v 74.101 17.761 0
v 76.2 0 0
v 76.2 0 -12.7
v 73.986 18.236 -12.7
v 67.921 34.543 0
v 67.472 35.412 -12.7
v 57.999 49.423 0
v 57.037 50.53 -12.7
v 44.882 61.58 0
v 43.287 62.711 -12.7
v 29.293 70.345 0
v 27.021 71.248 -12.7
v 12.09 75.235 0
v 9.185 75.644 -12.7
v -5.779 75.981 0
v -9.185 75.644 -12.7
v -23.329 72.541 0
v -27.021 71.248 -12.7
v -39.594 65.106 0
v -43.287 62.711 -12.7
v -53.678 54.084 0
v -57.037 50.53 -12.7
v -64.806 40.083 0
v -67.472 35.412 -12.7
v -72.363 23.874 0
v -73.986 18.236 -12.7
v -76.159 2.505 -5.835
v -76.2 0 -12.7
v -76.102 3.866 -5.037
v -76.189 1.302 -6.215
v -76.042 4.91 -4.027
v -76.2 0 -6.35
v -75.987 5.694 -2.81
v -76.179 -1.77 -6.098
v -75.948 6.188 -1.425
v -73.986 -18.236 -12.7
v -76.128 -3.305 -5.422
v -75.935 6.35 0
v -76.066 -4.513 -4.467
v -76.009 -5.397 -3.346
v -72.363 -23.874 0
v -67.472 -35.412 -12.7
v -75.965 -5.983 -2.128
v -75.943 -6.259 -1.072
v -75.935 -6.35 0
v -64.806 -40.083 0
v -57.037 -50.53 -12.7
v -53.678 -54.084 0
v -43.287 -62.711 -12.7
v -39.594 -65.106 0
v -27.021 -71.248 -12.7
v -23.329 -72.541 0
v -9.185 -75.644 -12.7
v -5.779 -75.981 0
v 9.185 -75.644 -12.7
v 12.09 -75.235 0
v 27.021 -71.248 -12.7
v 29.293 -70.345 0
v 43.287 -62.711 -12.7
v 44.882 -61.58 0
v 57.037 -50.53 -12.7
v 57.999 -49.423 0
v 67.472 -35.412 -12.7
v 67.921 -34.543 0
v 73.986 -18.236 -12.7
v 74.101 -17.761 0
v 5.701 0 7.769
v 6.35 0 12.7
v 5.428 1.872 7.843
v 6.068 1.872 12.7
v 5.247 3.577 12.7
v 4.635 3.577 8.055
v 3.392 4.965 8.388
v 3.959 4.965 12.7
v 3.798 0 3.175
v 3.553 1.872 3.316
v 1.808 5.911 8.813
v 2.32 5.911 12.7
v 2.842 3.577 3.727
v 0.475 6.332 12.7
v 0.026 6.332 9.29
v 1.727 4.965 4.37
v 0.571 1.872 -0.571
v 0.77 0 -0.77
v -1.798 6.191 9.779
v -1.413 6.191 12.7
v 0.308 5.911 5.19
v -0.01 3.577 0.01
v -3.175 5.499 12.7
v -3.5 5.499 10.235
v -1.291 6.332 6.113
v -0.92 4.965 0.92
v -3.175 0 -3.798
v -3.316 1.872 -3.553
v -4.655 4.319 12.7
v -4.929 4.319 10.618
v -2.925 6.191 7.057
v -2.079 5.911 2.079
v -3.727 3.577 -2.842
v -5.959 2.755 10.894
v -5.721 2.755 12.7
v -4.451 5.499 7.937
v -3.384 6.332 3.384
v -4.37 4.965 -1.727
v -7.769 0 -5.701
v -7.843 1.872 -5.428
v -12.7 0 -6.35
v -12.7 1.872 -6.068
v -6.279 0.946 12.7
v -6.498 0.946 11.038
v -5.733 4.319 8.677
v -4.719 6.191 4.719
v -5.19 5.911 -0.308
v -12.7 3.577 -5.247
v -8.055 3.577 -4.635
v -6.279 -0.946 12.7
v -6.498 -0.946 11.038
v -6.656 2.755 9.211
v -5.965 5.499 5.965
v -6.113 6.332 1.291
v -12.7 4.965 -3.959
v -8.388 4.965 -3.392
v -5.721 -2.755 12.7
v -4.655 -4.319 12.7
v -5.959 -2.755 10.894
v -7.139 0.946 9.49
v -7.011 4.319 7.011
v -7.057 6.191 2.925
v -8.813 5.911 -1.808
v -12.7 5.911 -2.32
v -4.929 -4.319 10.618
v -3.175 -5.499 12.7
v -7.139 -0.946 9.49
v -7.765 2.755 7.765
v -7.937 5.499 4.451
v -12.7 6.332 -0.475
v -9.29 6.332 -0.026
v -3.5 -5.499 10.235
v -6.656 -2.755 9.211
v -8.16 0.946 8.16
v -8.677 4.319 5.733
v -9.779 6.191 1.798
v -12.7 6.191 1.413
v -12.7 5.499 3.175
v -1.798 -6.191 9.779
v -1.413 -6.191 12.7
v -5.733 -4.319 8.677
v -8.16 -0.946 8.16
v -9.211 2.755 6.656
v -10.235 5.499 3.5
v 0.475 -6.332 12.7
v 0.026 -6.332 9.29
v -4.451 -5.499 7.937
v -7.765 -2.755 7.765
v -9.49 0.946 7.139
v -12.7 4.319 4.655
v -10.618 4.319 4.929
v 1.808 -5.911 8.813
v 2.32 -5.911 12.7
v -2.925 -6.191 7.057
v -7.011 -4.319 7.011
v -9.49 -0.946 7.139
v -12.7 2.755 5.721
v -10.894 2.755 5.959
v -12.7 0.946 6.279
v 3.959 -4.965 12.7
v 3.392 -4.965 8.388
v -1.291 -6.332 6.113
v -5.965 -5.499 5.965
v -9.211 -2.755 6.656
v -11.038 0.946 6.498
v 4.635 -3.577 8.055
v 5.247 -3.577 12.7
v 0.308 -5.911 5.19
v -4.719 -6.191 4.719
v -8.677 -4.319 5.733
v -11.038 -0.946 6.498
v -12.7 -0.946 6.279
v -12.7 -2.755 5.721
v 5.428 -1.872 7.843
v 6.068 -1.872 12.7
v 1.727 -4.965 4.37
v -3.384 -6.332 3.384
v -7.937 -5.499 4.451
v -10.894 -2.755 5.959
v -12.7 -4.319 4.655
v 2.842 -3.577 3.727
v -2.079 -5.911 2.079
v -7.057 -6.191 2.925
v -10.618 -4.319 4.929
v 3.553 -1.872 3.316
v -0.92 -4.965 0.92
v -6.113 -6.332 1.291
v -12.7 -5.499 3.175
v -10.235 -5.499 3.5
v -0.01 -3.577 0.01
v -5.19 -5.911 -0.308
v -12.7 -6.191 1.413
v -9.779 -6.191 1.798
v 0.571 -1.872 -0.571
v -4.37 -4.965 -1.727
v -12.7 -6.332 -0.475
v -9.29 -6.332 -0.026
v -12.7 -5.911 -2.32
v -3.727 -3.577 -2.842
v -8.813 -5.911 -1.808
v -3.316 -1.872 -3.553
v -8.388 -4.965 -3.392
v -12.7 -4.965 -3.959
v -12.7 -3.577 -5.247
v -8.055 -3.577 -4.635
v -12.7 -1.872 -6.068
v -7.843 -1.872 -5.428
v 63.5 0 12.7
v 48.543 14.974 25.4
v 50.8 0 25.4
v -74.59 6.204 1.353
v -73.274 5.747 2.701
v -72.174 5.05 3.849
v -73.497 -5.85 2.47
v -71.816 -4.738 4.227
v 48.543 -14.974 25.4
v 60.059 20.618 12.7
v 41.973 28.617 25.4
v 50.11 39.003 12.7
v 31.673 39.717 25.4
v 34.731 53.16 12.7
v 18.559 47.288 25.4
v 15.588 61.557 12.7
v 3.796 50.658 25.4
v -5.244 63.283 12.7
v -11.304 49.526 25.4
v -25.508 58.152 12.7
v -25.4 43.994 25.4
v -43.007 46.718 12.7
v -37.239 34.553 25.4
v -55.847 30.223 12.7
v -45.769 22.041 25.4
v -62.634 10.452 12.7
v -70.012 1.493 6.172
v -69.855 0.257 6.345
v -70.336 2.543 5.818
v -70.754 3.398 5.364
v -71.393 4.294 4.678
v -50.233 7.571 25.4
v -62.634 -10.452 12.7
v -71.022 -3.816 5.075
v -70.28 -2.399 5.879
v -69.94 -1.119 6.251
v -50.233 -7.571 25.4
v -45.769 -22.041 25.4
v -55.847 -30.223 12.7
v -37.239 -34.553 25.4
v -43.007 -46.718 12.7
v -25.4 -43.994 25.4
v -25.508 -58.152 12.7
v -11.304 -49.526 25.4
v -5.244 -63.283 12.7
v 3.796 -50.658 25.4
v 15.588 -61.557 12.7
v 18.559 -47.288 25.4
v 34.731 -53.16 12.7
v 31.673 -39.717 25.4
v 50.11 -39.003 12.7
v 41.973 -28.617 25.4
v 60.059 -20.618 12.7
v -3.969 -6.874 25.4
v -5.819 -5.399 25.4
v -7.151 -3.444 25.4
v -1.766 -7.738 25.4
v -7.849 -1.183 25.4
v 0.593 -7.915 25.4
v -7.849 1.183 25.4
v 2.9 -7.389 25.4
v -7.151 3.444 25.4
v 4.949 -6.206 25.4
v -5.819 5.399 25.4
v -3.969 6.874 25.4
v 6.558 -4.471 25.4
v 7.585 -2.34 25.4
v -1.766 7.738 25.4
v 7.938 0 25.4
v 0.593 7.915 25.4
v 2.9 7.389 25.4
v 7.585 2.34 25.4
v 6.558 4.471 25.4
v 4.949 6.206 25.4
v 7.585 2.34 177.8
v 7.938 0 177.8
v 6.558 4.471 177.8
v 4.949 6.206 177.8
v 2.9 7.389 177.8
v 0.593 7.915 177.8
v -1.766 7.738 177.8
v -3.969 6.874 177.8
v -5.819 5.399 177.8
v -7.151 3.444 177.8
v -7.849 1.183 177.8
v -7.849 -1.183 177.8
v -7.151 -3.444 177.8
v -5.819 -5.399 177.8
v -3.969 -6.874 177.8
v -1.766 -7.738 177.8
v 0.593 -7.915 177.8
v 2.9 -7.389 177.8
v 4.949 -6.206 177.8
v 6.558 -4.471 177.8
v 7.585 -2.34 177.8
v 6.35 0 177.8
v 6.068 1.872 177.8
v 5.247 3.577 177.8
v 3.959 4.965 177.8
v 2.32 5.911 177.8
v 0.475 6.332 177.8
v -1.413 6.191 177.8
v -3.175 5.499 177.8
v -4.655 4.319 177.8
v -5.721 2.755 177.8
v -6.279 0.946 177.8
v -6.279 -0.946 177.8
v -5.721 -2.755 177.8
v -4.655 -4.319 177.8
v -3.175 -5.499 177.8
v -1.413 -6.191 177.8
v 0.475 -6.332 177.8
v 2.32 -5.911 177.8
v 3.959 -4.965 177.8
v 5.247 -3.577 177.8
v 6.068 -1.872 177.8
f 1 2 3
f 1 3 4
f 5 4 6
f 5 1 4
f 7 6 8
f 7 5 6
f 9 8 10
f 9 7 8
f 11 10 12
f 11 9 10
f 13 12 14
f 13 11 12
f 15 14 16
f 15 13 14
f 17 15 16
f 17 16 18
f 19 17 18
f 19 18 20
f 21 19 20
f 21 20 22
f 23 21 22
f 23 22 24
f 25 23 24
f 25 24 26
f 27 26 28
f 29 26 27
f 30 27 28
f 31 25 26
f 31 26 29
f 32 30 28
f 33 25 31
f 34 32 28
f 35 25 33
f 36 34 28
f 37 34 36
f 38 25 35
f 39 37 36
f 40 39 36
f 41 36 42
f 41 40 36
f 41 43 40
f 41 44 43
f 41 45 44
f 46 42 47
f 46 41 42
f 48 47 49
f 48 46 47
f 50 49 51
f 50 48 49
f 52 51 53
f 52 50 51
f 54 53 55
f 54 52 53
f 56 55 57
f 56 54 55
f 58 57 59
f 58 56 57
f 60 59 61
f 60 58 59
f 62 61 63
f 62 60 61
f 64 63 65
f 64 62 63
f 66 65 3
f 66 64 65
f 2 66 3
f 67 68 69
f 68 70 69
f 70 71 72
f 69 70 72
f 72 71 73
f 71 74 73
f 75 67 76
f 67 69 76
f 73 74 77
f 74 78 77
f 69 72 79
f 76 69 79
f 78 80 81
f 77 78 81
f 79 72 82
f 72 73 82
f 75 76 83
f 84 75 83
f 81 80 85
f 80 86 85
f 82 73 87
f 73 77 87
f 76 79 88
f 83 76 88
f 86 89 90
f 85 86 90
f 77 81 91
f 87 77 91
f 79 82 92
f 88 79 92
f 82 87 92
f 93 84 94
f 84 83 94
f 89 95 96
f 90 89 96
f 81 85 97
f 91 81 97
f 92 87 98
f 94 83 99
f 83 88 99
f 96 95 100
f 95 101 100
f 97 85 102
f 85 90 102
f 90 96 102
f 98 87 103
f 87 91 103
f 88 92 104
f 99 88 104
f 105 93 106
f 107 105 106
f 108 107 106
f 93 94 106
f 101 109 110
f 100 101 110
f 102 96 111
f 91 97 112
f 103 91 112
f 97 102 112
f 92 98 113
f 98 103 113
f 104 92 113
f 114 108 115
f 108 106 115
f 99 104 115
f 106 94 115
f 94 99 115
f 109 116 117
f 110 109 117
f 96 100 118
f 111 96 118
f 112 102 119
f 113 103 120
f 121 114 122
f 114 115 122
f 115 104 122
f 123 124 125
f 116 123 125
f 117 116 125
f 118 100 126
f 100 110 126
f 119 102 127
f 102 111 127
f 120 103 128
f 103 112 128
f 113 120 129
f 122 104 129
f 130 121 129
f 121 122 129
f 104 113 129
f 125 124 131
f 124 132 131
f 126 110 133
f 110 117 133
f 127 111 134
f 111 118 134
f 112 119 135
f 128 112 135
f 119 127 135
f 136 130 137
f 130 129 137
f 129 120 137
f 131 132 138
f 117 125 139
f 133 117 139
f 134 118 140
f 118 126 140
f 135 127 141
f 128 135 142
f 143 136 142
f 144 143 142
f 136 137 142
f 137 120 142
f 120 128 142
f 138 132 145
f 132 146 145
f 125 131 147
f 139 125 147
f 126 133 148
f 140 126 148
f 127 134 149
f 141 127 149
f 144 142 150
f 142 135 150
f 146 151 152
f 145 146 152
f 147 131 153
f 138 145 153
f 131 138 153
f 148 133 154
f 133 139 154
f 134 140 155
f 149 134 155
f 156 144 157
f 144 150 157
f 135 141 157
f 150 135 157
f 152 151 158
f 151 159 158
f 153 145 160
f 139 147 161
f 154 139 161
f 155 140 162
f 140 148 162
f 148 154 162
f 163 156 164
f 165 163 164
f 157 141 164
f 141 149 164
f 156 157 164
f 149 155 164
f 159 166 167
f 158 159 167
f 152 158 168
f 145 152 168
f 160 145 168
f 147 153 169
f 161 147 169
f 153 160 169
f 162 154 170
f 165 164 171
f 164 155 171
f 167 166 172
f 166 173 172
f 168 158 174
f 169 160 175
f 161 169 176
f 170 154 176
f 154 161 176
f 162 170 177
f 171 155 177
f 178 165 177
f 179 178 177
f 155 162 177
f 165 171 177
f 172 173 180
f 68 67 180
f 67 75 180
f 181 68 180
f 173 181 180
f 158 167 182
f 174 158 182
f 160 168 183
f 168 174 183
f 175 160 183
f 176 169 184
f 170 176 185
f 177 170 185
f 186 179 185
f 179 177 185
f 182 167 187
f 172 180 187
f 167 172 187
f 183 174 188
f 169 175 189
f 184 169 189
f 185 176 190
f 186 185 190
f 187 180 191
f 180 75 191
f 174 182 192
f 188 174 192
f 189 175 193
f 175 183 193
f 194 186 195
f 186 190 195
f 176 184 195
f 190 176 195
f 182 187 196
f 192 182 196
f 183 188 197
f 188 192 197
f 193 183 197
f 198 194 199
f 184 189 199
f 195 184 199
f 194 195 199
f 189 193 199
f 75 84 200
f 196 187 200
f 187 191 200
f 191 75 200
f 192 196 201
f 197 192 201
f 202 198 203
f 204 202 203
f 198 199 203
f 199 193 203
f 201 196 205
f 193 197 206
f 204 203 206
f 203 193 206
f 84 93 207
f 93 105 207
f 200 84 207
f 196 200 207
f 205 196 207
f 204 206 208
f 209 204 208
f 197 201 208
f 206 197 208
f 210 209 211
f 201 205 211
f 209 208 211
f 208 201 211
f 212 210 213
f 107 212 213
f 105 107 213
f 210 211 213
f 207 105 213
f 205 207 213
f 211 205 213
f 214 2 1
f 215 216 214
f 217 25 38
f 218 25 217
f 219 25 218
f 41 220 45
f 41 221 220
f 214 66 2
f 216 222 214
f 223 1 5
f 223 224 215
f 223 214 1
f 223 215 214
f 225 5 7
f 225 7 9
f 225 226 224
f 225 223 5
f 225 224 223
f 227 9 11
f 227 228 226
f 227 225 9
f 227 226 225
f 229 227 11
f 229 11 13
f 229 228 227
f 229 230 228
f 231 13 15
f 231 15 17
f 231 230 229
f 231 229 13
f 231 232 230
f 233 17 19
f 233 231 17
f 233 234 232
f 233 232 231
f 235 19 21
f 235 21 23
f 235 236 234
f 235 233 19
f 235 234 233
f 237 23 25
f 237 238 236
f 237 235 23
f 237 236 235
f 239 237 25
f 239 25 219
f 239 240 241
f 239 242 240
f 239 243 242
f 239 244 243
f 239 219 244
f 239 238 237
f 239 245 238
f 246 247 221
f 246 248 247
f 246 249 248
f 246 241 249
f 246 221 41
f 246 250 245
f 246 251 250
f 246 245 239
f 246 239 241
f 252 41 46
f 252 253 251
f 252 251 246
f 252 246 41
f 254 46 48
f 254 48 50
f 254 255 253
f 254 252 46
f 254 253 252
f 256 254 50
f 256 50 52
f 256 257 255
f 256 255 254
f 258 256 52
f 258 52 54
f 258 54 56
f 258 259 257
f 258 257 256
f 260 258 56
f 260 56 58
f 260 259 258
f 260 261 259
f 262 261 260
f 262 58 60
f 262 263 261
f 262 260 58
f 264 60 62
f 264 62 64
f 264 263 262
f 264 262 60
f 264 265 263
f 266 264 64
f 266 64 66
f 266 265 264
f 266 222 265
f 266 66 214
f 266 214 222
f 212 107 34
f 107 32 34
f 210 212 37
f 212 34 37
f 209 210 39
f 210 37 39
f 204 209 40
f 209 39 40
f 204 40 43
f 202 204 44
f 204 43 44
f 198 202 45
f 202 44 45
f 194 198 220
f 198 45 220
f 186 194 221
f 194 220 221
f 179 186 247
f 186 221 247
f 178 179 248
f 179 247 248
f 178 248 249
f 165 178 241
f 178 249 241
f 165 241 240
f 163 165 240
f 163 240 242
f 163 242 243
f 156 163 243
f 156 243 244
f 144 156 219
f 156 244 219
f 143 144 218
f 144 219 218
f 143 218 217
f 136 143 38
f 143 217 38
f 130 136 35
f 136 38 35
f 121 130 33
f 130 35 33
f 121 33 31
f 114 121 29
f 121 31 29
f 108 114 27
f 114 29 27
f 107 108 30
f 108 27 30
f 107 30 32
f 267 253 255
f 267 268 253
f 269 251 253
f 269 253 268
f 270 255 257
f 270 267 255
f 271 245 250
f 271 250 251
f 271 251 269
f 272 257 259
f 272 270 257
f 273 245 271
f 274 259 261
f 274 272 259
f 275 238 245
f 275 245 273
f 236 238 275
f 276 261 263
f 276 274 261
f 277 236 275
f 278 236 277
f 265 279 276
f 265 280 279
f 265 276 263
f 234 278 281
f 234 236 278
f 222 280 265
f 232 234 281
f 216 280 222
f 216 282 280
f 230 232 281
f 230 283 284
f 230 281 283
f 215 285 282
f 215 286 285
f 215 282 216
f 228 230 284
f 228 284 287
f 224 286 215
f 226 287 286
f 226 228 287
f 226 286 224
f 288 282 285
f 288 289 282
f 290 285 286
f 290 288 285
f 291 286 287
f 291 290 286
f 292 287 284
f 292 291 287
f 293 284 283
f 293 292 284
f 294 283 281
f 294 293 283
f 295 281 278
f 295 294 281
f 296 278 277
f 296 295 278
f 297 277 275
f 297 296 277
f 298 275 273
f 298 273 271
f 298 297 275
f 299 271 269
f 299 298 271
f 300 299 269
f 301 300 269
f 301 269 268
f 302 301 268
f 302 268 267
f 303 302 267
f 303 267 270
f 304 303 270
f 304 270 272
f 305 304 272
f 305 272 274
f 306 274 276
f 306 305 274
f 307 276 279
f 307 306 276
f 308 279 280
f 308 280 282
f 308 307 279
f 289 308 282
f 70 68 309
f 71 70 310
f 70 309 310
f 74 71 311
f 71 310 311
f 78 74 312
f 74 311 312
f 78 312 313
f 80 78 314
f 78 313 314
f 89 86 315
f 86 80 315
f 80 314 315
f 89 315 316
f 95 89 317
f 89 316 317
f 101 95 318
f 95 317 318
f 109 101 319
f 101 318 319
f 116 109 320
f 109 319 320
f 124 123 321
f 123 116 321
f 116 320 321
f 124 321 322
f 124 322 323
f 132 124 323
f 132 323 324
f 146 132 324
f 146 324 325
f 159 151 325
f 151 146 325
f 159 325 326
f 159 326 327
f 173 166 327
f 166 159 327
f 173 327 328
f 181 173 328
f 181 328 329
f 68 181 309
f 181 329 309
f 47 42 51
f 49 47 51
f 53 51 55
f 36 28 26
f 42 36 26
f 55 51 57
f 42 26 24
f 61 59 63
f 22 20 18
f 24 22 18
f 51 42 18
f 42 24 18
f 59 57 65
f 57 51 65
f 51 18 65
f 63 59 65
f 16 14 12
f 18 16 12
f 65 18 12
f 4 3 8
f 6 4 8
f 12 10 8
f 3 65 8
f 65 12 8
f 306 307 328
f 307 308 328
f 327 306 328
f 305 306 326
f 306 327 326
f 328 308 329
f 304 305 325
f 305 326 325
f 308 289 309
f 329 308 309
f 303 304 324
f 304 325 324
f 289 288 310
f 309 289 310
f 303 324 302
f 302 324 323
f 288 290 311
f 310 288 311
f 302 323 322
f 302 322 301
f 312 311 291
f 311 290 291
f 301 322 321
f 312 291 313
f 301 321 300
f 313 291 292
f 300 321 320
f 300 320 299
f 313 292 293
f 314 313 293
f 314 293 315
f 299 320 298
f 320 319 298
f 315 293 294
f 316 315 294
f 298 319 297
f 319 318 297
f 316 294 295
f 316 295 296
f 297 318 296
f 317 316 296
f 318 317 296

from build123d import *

# Parameters (mm, degrees)
F0_R     = 76.2
F2_R     = 50.8
F4_DEPTH = 12.7
F5_R     = 6.35
F8_W     = 1.5875
F8_H     = 152.4


with BuildPart() as f3:
    # F0 (on Top) → F3 section 0
    with BuildSketch(Plane.XY):
        Circle(F0_R)
    # F2 (on offset) → F3 section 1
    with BuildSketch(Plane.XY.offset(25.4)):
        Circle(F2_R)
    loft()

    # F0 (on Top) → F4 (join)
    with BuildSketch(Plane.XY):
        Circle(F0_R)
    extrude(amount=-F4_DEPTH)

    # F7: sweep along a path in F6
    with BuildLine(Plane.XZ) as f7_path:
        Line((0, 25.4), (0, 12.7))
        ThreePointArc((0, 12.7), (-3.7197438789, 3.7197438789), (-12.7, 0))
        Line((-12.7, 0), (-82.2157882963, 0))
    # F5 (on face) → F7 (sweep, cut)
    with BuildSketch(Plane.XY.offset(25.4)):
        Circle(F5_R)
    sweep(path=f7_path.line, mode=Mode.SUBTRACT)

    # F8 (on Front) → F9 (revolve)
    with BuildSketch(Plane.XZ):
        with Locations((7.14375, 101.6)):
            Rectangle(F8_W, F8_H)
    revolve(axis=Axis((0, 0, 88.9), (0, 0, 1)))


solid = f3.part
